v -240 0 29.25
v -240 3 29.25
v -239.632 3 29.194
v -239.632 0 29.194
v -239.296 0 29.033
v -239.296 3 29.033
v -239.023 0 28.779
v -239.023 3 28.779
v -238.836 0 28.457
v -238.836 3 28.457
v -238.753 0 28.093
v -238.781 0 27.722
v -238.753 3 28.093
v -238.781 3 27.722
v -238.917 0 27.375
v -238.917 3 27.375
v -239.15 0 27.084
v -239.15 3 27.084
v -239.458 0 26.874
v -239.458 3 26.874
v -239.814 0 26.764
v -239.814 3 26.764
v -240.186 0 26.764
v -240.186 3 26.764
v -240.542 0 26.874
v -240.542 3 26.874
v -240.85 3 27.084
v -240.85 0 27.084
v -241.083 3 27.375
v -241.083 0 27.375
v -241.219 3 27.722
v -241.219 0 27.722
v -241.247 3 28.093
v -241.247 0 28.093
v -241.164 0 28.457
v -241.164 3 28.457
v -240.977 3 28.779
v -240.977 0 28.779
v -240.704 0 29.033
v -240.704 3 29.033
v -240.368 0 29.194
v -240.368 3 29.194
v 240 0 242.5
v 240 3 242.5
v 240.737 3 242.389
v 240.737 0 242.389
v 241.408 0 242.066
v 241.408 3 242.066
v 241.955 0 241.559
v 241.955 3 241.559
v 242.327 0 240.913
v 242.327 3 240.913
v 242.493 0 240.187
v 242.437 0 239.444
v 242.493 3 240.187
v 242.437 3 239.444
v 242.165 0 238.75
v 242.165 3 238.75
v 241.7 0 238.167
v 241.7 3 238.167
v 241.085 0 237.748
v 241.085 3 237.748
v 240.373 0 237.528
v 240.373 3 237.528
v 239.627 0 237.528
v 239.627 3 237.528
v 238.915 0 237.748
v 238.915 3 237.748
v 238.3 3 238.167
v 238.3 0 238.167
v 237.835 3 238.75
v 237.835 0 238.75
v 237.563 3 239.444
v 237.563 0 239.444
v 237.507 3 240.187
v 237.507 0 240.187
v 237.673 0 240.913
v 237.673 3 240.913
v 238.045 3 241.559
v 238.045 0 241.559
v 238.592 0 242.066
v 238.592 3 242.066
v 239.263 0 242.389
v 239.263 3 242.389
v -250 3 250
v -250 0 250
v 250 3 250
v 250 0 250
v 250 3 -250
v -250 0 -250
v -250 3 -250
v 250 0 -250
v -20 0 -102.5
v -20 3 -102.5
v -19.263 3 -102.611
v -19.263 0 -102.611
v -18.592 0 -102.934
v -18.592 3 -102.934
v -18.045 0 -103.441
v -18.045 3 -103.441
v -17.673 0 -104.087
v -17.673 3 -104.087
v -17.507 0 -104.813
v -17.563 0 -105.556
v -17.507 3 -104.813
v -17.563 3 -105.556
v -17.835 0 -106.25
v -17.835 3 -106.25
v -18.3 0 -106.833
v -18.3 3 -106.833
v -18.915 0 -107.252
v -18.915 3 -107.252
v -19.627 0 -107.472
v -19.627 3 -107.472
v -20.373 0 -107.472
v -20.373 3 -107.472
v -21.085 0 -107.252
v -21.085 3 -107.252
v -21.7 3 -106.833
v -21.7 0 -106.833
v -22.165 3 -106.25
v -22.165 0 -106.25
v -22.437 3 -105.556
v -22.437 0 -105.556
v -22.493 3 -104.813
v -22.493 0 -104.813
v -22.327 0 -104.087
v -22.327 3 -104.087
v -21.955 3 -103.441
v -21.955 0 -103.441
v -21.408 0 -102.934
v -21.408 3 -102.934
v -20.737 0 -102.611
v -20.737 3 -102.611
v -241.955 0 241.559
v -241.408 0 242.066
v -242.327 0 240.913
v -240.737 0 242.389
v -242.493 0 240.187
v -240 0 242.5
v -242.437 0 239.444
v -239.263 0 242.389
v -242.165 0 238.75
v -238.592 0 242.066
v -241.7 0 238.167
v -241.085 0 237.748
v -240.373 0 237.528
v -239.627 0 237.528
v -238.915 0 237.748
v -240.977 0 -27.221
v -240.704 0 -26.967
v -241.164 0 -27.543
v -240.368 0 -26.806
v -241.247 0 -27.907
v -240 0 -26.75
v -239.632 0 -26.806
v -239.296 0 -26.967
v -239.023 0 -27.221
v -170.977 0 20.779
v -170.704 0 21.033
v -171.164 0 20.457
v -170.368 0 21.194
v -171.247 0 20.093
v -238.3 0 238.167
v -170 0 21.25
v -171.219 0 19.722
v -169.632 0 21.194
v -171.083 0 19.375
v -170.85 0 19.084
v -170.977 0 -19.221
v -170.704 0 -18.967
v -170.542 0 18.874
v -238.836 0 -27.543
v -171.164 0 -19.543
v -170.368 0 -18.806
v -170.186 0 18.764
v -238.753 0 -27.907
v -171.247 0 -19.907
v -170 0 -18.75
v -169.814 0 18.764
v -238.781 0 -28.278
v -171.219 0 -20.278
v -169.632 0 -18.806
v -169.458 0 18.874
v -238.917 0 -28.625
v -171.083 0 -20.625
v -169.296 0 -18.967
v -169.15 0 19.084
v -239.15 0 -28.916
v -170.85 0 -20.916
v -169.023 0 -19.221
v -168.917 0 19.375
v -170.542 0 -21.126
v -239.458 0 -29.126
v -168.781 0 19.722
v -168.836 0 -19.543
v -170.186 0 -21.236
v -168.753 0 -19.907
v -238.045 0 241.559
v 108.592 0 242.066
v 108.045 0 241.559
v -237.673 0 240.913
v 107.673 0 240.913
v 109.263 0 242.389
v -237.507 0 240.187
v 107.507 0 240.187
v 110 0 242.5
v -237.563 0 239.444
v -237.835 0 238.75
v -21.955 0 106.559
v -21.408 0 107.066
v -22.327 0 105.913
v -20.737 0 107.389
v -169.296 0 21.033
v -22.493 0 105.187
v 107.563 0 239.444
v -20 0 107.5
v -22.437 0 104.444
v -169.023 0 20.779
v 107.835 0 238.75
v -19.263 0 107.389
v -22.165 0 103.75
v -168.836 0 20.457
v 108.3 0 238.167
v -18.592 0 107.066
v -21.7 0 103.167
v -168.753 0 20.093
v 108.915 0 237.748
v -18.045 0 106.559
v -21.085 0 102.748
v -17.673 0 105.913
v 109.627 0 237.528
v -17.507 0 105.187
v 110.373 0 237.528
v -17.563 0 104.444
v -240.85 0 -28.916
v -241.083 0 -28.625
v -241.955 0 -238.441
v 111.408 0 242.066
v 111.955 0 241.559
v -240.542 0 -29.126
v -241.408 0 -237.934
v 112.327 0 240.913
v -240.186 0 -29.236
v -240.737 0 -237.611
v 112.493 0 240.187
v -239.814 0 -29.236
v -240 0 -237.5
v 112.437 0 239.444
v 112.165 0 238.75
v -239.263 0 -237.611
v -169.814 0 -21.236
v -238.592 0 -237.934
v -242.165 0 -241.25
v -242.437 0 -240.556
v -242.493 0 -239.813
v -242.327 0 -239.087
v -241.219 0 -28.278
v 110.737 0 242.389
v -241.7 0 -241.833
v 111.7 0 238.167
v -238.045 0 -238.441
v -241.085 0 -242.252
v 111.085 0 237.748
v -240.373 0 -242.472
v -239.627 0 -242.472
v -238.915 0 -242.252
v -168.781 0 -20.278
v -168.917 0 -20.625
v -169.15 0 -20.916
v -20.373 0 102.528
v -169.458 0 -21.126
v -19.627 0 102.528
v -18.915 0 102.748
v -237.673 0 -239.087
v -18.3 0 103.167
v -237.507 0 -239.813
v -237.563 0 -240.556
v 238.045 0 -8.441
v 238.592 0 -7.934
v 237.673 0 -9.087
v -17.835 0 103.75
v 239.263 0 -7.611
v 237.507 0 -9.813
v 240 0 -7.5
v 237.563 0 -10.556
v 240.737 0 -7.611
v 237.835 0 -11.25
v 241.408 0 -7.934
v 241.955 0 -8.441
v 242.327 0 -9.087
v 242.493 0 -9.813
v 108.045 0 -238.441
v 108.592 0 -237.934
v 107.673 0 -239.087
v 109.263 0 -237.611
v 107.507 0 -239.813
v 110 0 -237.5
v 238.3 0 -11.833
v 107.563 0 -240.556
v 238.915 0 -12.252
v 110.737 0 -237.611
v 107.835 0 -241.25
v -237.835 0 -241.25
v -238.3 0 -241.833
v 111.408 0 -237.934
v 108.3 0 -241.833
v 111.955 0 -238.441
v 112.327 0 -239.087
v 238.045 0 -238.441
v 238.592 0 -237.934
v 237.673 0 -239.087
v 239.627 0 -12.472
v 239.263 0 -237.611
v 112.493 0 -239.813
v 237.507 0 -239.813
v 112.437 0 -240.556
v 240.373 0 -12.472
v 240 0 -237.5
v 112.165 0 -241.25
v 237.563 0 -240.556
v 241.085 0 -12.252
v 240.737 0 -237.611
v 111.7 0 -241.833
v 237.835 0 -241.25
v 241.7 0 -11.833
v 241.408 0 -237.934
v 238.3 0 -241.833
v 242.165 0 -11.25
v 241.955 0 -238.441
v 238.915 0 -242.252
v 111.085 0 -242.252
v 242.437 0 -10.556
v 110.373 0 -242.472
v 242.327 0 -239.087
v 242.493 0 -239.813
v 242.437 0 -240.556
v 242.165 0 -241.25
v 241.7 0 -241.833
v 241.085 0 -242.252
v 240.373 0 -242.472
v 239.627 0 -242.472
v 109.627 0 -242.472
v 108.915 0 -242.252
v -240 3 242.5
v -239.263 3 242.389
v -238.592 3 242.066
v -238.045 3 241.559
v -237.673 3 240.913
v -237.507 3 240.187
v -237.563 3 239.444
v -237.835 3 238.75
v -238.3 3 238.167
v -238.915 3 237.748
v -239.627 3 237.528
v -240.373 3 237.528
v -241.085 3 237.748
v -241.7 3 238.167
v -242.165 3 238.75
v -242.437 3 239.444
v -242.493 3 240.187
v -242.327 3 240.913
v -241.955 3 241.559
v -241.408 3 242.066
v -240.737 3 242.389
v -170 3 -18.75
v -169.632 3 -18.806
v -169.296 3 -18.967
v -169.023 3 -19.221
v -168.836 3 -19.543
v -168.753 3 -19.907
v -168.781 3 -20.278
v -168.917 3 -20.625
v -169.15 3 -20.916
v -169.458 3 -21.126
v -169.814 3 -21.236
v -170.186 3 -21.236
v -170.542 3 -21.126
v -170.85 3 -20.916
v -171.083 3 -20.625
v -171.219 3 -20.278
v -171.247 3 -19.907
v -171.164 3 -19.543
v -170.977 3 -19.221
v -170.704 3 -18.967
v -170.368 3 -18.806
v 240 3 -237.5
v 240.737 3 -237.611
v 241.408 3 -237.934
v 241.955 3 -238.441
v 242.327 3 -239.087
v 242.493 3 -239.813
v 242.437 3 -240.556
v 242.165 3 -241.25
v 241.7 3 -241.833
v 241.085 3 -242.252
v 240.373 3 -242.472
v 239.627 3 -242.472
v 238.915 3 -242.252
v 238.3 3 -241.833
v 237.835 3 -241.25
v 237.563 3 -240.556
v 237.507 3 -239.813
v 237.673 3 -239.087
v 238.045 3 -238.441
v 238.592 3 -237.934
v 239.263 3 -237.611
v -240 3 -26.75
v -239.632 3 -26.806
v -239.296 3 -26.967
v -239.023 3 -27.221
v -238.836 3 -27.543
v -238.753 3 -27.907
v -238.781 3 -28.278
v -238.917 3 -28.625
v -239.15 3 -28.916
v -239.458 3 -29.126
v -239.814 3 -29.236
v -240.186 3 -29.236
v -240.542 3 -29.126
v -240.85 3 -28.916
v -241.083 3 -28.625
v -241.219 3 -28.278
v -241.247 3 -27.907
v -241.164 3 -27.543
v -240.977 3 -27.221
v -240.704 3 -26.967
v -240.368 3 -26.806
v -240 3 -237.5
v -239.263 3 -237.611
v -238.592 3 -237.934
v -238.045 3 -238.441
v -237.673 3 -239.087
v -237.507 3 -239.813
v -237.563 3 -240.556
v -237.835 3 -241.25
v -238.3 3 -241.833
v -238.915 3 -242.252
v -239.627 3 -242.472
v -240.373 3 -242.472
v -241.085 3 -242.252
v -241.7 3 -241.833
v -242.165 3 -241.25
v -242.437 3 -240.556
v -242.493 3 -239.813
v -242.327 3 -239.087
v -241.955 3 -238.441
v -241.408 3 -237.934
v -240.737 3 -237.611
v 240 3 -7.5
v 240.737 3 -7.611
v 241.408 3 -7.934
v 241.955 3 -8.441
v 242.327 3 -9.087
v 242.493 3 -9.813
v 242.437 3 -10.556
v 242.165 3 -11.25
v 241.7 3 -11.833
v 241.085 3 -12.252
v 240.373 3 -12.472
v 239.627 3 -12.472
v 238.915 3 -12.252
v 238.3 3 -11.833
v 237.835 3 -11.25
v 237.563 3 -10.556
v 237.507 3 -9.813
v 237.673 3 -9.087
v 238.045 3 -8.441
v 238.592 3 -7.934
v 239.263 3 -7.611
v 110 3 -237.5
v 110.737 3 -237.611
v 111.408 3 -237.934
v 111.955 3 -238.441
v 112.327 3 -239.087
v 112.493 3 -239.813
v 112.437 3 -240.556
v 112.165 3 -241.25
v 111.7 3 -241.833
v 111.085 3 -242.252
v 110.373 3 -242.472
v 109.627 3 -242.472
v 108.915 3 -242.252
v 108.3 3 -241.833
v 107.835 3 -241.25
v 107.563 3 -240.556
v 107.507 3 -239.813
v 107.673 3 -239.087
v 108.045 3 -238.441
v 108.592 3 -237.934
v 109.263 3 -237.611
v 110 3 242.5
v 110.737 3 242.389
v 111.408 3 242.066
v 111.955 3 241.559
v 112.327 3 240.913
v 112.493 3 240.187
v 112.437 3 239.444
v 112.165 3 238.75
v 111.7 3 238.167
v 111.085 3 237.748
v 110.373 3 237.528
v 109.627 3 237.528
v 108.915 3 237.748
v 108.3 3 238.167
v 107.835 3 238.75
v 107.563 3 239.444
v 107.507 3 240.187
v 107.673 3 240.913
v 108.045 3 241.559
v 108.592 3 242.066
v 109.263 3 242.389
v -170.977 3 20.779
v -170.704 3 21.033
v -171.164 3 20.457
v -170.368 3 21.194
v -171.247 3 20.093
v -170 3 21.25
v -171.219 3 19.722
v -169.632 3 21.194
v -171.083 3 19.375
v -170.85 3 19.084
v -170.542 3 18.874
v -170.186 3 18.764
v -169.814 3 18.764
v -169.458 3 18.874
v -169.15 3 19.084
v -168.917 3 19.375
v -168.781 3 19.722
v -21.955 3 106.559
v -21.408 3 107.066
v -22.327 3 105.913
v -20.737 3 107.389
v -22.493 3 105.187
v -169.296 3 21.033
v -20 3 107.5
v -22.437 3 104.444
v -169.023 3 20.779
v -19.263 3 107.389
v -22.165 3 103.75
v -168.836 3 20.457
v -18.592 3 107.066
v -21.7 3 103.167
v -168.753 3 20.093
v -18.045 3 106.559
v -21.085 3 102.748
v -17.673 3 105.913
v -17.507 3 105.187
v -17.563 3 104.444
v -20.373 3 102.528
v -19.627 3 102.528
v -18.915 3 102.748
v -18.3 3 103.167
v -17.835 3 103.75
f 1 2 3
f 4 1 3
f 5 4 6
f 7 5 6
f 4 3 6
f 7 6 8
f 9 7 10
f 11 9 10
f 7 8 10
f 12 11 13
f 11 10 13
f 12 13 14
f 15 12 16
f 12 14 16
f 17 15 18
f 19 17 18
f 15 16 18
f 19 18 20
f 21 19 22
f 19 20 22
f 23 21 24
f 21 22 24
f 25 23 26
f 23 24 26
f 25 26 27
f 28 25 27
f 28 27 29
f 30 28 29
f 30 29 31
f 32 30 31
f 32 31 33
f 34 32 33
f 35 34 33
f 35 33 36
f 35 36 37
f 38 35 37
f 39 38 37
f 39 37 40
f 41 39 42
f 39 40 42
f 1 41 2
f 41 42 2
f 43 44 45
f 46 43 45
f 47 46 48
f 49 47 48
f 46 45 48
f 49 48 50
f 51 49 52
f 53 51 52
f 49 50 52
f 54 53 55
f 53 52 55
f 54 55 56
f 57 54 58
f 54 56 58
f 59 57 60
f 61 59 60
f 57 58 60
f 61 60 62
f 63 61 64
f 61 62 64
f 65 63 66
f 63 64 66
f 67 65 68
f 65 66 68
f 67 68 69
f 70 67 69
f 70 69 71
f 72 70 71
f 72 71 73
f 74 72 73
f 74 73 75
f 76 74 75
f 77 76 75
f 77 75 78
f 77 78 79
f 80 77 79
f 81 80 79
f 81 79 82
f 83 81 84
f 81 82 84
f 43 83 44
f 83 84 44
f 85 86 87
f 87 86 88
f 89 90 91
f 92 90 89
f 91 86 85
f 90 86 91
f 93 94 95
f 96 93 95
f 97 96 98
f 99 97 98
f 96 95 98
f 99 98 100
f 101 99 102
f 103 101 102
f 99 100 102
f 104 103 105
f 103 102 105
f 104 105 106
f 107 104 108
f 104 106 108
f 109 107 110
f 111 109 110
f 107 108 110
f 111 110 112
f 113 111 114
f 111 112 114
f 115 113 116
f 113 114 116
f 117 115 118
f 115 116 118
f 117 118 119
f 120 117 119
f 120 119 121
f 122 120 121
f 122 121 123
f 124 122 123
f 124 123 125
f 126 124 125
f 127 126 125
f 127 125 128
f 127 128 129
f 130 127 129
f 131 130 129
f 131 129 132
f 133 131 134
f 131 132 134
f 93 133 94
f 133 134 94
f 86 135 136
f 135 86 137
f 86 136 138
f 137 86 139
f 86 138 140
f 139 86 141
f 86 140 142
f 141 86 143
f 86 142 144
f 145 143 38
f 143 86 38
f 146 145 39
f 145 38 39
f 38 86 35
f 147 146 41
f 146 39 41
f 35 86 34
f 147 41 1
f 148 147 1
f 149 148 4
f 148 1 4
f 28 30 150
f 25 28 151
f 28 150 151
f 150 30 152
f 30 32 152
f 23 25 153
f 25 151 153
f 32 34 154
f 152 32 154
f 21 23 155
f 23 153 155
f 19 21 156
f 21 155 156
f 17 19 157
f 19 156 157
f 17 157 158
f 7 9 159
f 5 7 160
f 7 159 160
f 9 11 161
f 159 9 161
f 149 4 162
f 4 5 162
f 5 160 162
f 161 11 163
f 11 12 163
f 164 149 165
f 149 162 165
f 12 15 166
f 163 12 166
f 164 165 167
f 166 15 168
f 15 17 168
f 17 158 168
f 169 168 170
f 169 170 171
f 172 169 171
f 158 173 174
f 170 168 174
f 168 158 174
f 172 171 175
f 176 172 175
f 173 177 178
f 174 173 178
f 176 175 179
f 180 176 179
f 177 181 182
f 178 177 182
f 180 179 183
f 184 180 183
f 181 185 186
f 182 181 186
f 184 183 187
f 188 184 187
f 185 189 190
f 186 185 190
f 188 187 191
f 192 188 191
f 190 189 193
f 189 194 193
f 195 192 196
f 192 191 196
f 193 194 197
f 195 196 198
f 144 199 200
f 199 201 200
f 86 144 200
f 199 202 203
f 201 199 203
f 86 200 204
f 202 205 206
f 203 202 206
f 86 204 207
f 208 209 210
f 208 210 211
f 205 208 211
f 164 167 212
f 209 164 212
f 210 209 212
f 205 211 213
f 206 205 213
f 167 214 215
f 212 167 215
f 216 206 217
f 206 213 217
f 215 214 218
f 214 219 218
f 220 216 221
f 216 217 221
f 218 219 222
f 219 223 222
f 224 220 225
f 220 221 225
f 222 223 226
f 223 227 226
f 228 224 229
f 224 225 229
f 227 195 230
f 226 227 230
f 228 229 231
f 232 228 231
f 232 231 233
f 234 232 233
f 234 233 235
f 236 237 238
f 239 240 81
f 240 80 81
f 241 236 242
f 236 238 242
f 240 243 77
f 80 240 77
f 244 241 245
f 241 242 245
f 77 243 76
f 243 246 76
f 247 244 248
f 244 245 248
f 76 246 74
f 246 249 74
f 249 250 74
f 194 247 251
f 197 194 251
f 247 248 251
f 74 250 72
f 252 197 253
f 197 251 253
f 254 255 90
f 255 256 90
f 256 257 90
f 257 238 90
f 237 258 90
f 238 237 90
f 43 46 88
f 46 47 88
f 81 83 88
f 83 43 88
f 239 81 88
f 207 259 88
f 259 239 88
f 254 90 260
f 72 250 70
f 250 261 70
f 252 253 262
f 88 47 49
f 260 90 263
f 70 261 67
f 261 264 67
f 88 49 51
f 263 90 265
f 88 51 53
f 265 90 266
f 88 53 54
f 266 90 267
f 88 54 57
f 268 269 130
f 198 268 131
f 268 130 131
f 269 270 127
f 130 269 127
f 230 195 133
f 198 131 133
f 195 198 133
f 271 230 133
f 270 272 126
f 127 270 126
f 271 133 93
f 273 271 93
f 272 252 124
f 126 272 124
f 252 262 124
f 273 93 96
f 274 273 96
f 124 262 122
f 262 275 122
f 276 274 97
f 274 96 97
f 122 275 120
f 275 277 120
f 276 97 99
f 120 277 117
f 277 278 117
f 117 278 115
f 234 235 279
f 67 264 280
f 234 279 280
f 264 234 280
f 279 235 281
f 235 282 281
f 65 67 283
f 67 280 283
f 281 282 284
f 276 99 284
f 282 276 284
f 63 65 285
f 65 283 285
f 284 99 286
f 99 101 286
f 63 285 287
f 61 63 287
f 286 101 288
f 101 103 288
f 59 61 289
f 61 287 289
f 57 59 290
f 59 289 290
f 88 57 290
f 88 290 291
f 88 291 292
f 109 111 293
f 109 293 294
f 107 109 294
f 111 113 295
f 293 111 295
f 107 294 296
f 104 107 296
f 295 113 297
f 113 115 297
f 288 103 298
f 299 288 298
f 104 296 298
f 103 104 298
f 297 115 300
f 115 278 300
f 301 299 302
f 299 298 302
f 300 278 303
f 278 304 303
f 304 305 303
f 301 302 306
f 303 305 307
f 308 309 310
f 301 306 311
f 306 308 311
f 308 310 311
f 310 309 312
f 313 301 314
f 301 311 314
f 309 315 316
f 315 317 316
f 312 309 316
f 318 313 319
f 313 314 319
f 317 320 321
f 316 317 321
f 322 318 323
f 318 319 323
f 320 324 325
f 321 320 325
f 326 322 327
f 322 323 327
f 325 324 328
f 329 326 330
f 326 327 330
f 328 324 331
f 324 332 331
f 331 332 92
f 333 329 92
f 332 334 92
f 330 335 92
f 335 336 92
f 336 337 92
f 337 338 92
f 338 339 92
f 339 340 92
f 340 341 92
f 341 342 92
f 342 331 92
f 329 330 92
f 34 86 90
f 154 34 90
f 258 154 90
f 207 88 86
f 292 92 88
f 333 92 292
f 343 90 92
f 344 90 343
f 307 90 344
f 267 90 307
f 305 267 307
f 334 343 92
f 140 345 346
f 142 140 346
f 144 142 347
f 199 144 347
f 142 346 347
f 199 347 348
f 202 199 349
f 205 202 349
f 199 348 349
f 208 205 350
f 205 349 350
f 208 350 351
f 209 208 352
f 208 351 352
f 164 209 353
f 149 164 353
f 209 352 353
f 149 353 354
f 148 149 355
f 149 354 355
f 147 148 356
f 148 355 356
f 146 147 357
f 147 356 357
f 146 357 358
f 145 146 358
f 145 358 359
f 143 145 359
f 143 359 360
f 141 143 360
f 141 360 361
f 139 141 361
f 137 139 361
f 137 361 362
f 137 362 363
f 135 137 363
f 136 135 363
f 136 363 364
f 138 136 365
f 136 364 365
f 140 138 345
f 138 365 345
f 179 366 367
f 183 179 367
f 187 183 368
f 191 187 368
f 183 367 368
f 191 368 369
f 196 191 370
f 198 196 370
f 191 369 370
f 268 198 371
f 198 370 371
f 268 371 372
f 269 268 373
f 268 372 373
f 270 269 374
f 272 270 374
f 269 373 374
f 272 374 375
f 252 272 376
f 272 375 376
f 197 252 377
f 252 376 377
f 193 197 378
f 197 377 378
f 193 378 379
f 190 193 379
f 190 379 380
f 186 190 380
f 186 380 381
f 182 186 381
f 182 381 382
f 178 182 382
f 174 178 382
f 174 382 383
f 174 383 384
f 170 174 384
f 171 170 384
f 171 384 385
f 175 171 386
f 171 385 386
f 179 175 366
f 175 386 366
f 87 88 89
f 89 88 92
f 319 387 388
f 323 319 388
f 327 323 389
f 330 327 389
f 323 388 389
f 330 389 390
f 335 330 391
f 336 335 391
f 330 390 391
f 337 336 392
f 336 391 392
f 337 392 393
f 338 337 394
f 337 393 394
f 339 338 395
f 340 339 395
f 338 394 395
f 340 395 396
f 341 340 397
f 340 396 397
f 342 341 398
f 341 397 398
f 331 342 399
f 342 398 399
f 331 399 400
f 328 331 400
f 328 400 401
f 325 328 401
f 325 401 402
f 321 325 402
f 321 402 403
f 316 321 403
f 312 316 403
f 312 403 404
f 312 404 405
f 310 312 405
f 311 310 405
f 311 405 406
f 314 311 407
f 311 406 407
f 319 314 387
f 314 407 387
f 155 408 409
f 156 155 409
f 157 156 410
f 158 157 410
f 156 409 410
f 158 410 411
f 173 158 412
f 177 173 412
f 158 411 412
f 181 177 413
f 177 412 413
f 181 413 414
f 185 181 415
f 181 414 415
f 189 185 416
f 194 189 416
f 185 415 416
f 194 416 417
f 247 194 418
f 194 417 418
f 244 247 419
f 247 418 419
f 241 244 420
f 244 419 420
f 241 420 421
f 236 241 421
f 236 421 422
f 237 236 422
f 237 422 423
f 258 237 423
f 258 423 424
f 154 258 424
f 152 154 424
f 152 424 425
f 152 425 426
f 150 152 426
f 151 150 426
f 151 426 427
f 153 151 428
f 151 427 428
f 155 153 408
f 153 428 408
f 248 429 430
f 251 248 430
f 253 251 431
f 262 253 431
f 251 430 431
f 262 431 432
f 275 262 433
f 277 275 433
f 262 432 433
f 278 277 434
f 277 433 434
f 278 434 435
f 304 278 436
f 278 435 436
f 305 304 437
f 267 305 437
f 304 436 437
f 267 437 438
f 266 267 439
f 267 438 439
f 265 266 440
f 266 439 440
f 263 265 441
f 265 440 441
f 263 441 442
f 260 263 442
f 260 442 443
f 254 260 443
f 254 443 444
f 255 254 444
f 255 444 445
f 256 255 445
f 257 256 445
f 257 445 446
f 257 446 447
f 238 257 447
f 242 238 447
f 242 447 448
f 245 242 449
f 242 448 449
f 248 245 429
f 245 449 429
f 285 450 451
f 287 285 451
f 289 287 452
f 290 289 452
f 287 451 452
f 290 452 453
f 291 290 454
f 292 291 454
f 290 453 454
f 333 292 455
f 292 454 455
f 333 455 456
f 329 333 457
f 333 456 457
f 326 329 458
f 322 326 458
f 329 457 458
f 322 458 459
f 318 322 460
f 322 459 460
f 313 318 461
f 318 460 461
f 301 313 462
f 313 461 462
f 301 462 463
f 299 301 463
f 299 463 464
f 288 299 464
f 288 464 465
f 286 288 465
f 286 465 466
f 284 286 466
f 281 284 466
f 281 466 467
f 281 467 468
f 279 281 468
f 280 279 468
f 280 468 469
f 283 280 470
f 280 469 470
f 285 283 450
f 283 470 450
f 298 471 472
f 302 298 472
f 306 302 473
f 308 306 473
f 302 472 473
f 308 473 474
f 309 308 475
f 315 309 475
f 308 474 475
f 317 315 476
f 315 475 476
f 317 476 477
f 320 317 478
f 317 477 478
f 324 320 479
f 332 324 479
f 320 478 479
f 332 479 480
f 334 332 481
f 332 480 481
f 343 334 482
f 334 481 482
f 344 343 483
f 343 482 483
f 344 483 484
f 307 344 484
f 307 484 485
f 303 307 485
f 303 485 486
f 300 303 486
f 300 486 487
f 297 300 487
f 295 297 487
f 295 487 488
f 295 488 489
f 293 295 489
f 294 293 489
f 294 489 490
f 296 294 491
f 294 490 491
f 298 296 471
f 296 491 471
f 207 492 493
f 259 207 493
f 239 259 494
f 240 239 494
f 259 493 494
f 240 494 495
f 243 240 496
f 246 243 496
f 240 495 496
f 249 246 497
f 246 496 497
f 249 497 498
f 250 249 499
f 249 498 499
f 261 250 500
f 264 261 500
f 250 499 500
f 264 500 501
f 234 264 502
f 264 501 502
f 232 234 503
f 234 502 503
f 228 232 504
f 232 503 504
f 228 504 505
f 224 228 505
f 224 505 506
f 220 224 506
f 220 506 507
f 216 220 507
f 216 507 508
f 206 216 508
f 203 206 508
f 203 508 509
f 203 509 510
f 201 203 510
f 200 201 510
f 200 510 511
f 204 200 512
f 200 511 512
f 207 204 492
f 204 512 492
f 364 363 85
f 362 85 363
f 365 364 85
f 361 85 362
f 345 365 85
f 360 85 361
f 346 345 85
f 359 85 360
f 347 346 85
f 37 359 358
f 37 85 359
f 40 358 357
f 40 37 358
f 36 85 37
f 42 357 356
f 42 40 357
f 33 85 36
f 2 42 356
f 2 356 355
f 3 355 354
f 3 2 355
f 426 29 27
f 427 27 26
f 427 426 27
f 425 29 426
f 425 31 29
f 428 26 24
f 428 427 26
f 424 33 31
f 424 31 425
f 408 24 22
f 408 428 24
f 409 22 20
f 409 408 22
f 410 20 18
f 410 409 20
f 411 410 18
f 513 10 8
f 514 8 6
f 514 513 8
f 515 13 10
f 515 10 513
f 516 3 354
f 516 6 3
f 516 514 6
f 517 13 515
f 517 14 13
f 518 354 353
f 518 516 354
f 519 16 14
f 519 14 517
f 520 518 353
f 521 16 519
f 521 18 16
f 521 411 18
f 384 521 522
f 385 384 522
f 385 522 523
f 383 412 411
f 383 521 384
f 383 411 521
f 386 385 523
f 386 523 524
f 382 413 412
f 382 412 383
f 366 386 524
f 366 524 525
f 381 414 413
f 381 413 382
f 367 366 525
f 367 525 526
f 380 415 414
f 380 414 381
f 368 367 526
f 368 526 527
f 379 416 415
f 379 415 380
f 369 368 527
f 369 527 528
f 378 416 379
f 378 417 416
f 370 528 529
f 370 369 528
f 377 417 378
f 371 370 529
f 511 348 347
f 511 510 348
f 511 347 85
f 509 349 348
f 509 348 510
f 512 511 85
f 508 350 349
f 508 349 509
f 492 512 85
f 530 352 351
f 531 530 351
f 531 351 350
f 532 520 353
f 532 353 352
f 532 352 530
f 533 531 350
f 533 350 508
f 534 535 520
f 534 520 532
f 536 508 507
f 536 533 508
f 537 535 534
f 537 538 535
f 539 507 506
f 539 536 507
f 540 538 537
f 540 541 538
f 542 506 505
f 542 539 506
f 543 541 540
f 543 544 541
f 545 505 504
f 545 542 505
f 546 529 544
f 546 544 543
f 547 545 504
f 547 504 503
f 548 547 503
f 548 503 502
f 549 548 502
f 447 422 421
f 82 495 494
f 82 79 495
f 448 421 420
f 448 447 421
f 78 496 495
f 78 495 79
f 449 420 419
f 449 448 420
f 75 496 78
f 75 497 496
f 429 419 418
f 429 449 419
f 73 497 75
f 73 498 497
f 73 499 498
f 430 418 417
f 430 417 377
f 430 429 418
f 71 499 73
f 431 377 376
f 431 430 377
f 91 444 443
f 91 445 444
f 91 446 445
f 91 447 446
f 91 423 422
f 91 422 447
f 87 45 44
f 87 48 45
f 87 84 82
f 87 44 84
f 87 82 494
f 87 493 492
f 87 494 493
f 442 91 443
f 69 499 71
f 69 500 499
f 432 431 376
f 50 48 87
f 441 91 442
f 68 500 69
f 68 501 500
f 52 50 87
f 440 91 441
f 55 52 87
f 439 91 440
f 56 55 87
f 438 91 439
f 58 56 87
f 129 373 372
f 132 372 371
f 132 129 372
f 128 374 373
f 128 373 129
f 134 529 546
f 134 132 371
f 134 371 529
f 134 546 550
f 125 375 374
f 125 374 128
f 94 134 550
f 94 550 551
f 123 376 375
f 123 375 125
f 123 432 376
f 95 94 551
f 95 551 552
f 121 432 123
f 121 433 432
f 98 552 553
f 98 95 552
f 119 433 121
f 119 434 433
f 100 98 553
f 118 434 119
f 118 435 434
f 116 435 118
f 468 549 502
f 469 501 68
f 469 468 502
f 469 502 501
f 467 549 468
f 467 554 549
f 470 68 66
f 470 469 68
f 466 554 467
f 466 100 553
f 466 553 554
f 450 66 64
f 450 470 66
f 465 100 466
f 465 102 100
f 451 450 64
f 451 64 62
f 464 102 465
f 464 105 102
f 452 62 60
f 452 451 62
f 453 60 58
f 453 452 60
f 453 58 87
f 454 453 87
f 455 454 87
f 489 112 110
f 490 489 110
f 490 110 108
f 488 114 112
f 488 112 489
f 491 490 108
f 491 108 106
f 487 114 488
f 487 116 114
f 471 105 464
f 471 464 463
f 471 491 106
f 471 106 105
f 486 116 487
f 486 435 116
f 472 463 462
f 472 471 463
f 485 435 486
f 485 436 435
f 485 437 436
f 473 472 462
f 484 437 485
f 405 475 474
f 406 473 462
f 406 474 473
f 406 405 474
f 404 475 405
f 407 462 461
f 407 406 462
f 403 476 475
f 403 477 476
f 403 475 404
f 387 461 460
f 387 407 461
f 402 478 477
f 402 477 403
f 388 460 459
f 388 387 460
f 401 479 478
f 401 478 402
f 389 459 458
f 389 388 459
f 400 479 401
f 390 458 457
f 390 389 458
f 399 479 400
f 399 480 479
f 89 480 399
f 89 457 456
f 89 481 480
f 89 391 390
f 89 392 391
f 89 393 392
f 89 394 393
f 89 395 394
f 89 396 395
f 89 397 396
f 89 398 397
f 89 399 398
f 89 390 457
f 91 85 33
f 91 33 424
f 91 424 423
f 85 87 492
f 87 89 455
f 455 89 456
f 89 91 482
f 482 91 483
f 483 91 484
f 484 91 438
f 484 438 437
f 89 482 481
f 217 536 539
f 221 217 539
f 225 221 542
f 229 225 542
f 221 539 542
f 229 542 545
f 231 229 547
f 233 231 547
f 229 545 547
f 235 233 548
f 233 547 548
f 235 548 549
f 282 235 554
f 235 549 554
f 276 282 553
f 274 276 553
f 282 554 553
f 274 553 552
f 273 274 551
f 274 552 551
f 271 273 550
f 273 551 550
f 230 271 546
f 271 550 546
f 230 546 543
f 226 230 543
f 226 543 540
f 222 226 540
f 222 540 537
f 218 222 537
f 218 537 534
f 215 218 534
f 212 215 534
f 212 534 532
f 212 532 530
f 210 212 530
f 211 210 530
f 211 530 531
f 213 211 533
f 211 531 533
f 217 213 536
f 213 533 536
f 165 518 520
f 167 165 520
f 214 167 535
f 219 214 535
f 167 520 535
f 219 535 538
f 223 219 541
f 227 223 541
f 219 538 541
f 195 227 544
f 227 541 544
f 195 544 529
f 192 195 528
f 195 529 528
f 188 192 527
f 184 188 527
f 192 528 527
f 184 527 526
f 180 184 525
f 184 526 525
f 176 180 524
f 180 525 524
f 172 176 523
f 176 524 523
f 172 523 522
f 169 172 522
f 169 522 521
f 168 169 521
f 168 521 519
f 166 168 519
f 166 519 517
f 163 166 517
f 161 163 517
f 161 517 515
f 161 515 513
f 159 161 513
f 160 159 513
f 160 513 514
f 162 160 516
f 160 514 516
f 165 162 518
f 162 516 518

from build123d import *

# Parameters (mm, degrees)
SKETCH1_W           = 500
SKETCH1_H           = 500
BOSS_EXTRUDE1_DEPTH = 3
SKETCH2_R           = 2.5
CUT_EXTRUDE1_DEPTH  = 3
SKETCH3_R           = 1.25
CUT_EXTRUDE2_DEPTH  = 3
SKETCH4_R           = 2.5
CUT_EXTRUDE3_DEPTH  = 3
SKETCH5_R           = 2.5
CUT_EXTRUDE4_DEPTH  = 3


with BuildPart() as part:
    # Sketch1 → Boss-Extrude1 (new body)
    with BuildSketch(Plane(origin=(0, 0, 0), x_dir=(1, 0, 0), z_dir=(0, 1, 0))):
        Rectangle(SKETCH1_W, SKETCH1_H)
    extrude(amount=BOSS_EXTRUDE1_DEPTH)

    # Sketch2 → Cut-Extrude1 (cut)
    with BuildSketch(Plane(origin=(0, 3, 0), x_dir=(1, 0, 0), z_dir=(0, 1, 0))):
        with Locations(Location((-240, 240, 0), (0, 0, 270))):
            Circle(SKETCH2_R)
        with Locations(Location((240, 240, 0), (0, 0, 270))):
            Circle(SKETCH2_R)
        with Locations(Location((240, -240, 0), (0, 0, 270))):
            Circle(SKETCH2_R)
        with Locations(Location((-240, -240, 0), (0, 0, 270))):
            Circle(SKETCH2_R)
    extrude(amount=-CUT_EXTRUDE1_DEPTH, mode=Mode.SUBTRACT)

    # Sketch3 → Cut-Extrude2 (cut)
    with BuildSketch(Plane(origin=(0, 3, 0), x_dir=(1, 0, 0), z_dir=(0, 1, 0))):
        with Locations(Location((-240, 28, 0), (0, 0, 270))):
            Circle(SKETCH3_R)
        with Locations(Location((-170, 20, 0), (0, 0, 270))):
            Circle(SKETCH3_R)
        with Locations(Location((-170, -20, 0), (0, 0, 270))):
            Circle(SKETCH3_R)
        with Locations(Location((-240, -28, 0), (0, 0, 270))):
            Circle(SKETCH3_R)
    extrude(amount=-CUT_EXTRUDE2_DEPTH, mode=Mode.SUBTRACT)

    # Sketch4 → Cut-Extrude3 (cut)
    with BuildSketch(Plane(origin=(0, 3, 0), x_dir=(1, 0, 0), z_dir=(0, 1, 0))):
        with Locations(Location((240, 10, 0), (0, 0, 270))):
            Circle(SKETCH4_R)
        with Locations(Location((110, 240, 0), (0, 0, 270))):
            Circle(SKETCH4_R)
        with Locations(Location((110, -240, 0), (0, 0, 270))):
            Circle(SKETCH4_R)
    extrude(amount=-CUT_EXTRUDE3_DEPTH, mode=Mode.SUBTRACT)

    # Sketch5 → Cut-Extrude4 (cut)
    with BuildSketch(Plane(origin=(0, 3, 0), x_dir=(1, 0, 0), z_dir=(0, 1, 0))):
        with Locations(Location((-20, 105, 0), (0, 0, 270))):
            Circle(SKETCH5_R)
        with Locations(Location((-20, -105, 0), (0, 0, 270))):
            Circle(SKETCH5_R)
    extrude(amount=-CUT_EXTRUDE4_DEPTH, mode=Mode.SUBTRACT)


solid = part.part
